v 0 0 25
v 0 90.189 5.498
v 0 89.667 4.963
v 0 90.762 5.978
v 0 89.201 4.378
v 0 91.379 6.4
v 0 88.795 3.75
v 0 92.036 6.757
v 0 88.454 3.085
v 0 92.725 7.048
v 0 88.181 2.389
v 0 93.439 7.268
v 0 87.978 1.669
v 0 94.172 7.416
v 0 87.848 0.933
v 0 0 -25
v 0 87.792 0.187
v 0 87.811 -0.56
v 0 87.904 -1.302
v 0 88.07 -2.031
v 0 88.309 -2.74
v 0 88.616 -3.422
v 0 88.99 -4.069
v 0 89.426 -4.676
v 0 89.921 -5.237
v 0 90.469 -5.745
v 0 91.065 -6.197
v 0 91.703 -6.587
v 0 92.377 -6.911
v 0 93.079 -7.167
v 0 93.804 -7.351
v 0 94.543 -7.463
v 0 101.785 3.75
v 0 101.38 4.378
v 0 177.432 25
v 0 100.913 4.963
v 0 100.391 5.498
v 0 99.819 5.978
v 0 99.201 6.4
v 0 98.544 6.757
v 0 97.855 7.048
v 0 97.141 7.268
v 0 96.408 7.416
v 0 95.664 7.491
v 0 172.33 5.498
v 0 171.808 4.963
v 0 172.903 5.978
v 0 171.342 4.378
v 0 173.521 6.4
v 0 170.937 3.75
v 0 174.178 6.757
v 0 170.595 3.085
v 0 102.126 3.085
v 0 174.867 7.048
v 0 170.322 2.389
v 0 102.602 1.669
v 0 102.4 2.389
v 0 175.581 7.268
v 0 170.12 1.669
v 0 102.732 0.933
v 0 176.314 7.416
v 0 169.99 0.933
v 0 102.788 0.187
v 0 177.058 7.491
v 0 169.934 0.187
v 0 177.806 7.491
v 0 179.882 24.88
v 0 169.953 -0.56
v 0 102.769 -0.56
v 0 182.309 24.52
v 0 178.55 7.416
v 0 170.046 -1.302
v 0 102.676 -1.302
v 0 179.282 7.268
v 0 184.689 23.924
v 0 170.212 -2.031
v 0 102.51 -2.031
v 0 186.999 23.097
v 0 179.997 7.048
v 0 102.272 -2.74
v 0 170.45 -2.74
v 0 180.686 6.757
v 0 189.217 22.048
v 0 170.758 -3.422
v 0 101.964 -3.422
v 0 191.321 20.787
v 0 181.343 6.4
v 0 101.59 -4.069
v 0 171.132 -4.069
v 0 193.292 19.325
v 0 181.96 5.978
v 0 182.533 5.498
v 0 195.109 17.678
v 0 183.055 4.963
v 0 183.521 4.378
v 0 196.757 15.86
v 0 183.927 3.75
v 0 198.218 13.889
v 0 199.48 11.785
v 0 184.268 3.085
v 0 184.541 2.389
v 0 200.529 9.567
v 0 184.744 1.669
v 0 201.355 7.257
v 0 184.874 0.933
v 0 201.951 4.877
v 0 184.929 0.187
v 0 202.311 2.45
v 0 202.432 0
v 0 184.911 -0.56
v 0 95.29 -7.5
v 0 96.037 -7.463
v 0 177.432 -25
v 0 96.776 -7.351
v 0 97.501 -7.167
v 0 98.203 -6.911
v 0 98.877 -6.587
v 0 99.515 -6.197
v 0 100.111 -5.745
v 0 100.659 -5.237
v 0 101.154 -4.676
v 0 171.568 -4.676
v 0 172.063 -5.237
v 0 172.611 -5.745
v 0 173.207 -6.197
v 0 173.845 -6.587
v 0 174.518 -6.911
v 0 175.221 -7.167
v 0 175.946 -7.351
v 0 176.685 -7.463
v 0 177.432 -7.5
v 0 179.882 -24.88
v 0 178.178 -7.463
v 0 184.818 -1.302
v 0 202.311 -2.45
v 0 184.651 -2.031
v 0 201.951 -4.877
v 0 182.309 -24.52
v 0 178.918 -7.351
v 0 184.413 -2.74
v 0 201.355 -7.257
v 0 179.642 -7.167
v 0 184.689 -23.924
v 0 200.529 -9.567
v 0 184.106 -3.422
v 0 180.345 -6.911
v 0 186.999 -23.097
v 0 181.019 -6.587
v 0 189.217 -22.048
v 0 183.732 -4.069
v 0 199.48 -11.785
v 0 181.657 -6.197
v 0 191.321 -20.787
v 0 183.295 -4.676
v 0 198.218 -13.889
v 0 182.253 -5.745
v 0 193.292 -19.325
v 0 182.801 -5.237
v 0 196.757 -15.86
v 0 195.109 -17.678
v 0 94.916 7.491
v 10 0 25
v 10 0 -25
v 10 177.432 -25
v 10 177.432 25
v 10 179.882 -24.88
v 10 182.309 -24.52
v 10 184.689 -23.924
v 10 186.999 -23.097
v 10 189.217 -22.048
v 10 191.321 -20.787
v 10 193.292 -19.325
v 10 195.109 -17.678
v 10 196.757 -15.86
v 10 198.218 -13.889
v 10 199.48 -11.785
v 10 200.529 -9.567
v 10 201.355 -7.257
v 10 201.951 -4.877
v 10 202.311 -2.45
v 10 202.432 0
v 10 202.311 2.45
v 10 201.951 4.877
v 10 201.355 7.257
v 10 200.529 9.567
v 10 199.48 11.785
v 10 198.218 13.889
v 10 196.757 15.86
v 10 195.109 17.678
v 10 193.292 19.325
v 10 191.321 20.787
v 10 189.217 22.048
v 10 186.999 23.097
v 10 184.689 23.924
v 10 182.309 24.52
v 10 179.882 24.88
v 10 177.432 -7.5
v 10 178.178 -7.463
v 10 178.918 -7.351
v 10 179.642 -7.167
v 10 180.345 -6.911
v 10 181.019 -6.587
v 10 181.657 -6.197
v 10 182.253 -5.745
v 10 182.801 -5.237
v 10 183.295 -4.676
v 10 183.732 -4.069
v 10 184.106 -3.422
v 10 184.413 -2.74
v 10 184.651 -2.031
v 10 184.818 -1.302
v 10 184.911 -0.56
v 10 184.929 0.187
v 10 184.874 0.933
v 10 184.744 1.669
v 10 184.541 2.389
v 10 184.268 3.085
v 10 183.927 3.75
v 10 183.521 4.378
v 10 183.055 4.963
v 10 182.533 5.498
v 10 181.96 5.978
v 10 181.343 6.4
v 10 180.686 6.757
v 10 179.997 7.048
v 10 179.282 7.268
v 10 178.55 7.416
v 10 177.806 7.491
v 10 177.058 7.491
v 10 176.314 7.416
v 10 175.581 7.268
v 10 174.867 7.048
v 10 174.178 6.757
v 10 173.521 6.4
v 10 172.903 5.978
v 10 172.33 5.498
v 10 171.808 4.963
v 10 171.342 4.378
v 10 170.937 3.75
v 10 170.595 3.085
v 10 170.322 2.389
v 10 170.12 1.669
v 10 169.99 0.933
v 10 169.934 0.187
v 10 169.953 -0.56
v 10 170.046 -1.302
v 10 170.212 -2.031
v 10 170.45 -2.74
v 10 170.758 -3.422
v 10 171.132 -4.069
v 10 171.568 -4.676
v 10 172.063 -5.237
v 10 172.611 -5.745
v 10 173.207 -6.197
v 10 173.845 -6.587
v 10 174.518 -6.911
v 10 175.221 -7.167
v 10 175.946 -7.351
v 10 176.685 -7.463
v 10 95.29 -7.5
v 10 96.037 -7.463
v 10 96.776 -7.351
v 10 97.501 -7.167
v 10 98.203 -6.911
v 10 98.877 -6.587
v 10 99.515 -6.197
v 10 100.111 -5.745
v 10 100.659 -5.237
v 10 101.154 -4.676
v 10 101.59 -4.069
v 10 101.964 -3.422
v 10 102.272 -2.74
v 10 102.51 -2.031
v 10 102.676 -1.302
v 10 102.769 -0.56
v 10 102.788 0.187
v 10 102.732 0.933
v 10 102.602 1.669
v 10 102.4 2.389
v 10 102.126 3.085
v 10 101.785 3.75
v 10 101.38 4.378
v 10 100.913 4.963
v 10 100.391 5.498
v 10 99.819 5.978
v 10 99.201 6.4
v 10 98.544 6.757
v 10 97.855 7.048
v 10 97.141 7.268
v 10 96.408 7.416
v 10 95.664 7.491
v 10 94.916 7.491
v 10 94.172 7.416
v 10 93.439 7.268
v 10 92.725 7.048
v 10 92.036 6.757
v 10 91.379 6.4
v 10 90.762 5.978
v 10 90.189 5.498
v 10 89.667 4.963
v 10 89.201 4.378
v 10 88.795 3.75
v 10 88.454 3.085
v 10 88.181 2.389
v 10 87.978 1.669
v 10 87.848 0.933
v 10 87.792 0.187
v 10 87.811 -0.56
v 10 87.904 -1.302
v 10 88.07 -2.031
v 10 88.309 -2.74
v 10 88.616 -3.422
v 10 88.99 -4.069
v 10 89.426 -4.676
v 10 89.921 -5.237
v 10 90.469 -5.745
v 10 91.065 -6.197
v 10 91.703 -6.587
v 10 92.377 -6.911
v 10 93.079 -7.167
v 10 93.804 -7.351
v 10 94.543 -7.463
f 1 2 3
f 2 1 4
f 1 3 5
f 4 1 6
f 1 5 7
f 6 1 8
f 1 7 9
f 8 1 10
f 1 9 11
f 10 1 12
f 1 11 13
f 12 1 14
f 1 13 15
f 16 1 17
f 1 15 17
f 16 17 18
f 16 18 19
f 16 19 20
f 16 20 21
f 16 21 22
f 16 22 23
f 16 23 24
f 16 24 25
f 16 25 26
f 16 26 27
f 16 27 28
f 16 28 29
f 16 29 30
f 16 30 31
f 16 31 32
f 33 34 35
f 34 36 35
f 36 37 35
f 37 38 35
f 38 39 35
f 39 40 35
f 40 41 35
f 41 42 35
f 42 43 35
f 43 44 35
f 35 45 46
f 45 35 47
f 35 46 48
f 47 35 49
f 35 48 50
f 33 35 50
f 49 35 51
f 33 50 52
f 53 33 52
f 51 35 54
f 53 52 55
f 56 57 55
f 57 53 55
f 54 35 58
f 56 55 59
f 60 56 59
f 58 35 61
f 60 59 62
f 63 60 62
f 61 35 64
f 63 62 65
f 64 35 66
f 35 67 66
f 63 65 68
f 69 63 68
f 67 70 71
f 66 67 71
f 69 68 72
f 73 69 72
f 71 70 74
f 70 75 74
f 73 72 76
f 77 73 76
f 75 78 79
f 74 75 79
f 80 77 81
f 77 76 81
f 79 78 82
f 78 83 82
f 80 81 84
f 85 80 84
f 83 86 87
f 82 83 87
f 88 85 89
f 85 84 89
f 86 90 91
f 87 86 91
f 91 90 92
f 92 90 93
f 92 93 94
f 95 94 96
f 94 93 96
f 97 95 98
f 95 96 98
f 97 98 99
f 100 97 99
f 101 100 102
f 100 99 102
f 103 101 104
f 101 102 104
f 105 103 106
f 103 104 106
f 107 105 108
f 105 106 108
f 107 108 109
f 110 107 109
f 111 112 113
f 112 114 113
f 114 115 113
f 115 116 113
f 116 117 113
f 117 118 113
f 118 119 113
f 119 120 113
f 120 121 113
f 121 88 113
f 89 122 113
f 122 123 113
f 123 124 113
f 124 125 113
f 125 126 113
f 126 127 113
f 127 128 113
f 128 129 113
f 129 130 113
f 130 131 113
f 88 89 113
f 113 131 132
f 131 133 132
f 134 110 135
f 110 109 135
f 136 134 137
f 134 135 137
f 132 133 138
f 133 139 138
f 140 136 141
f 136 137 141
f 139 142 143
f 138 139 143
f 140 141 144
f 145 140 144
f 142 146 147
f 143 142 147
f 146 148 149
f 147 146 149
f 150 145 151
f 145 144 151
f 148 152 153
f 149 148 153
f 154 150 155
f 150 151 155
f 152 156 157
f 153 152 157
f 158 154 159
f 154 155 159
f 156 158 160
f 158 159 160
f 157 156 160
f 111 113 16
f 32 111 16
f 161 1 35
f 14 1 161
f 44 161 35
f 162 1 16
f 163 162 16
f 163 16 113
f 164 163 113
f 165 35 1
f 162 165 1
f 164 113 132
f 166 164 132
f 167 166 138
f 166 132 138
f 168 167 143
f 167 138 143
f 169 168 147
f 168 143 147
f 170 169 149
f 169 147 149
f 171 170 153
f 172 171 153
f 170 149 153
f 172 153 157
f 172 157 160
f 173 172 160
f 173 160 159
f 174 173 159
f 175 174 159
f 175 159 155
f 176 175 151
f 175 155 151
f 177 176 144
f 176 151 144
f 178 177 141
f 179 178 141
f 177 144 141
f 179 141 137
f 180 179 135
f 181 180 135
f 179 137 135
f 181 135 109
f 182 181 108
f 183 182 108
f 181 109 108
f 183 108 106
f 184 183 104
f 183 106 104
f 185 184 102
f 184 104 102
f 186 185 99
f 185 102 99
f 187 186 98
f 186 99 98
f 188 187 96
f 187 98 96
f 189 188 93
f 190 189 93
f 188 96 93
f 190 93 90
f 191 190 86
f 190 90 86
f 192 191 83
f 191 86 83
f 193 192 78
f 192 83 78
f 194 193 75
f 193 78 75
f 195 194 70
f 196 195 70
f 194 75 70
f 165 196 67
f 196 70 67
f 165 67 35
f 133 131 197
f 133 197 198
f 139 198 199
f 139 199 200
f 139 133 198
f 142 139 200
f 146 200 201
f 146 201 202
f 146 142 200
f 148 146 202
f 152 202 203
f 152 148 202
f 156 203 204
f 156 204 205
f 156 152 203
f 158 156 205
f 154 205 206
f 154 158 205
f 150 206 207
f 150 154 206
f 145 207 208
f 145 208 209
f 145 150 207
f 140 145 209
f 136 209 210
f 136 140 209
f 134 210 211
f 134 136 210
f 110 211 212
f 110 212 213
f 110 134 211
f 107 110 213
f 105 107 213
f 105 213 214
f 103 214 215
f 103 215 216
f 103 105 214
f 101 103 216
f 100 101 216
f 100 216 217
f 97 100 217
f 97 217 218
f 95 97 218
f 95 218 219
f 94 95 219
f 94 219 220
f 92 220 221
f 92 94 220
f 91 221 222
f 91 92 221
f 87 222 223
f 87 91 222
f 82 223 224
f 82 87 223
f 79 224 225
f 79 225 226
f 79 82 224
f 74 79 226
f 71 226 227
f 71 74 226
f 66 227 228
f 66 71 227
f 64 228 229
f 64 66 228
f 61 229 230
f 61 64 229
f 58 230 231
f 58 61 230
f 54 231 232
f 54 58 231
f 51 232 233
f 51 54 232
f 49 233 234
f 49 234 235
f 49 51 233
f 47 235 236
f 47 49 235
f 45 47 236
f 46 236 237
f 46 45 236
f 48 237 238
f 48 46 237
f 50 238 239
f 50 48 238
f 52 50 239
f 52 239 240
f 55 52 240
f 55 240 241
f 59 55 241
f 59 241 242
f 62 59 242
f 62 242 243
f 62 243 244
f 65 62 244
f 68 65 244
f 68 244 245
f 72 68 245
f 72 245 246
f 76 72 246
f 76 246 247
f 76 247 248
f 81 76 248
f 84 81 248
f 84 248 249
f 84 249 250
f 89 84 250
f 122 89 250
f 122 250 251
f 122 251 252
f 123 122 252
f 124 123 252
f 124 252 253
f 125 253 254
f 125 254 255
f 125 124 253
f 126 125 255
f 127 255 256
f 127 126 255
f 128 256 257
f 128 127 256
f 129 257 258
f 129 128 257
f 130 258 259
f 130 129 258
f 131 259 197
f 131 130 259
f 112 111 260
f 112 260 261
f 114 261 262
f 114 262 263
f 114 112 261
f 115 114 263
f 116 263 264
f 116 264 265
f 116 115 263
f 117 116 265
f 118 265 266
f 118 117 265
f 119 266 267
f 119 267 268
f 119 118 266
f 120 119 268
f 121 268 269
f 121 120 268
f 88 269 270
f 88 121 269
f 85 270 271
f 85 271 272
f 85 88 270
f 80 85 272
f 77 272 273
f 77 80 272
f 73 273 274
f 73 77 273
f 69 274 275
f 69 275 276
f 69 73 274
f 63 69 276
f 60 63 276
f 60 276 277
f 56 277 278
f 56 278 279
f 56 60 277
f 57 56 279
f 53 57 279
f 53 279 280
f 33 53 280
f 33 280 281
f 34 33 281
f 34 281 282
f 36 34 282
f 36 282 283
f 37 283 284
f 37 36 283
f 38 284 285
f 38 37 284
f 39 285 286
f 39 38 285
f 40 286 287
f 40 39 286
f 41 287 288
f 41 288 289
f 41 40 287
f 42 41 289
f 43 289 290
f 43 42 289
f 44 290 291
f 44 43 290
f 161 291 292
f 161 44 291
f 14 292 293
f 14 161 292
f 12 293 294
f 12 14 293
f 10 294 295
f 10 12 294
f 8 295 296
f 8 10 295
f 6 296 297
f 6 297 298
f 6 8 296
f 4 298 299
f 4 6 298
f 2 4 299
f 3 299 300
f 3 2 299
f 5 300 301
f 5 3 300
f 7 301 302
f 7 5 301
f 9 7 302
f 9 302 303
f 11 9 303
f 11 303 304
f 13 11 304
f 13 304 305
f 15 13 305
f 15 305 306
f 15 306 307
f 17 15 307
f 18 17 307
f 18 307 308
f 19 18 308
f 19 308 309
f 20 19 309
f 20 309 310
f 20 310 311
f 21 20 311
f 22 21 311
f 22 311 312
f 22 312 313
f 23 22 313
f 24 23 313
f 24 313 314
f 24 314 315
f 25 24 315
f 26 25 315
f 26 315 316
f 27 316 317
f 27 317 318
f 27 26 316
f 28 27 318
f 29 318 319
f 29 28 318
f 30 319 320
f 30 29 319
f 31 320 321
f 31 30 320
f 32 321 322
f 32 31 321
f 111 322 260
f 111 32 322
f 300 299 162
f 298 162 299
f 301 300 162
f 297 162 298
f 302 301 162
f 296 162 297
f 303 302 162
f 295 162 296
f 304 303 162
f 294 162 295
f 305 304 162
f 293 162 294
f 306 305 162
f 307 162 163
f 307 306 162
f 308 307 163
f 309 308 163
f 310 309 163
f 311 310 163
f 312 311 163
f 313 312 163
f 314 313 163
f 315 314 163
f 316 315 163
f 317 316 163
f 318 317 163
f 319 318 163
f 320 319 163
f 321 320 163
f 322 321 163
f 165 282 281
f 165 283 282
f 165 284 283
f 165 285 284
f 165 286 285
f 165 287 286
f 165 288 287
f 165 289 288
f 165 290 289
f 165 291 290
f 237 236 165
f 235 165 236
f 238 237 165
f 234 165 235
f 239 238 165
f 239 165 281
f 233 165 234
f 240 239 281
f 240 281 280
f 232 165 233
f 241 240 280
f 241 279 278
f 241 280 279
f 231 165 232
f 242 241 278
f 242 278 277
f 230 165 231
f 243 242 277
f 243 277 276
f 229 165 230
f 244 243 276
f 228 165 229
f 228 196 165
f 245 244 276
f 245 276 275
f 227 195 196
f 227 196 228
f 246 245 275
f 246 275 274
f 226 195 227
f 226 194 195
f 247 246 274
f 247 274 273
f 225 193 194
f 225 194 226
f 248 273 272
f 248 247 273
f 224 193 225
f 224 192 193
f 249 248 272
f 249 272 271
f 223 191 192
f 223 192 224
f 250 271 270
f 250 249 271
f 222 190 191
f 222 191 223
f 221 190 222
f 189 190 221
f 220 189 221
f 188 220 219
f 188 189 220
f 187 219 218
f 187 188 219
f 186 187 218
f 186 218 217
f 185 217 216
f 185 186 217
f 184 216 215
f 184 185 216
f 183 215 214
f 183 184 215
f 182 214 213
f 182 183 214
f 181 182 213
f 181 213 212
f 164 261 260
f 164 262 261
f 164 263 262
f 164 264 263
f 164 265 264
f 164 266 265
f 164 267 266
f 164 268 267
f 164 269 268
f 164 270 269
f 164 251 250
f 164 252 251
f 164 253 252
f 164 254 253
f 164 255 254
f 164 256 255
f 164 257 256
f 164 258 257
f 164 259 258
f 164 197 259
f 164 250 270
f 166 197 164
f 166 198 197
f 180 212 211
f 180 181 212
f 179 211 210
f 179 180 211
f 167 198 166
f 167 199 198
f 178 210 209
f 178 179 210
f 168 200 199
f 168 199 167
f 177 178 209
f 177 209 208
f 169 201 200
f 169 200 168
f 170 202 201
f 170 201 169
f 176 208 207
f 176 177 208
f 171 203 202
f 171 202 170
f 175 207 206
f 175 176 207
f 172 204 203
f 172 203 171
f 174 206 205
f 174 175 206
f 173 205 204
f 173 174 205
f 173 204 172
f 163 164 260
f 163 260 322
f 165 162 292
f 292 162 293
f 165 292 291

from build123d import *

# Parameters (mm, degrees)
SKETCH1_R           = 7.5
BOSS_EXTRUDE1_DEPTH = 10


with BuildPart() as part:
    # Sketch1 → Boss-Extrude1 (new body)
    with BuildSketch(Plane(origin=(0, 0, 0), x_dir=(0, 0, -1), z_dir=(1, 0, 0))):
        with BuildLine():
            Line((-25, 0), (25, 0))
            Line((25, 0), (25, 177.43174))
            ThreePointArc((25, 177.43174), (0, 202.43174), (-25, 177.43174))
            Line((-25, 177.43174), (-25, 0))
        make_face()
        with Locations((0, 95.2901012)):
            Circle(SKETCH1_R, mode=Mode.SUBTRACT)
        with Locations((0, 177.43174)):
            Circle(SKETCH1_R, mode=Mode.SUBTRACT)
    extrude(amount=BOSS_EXTRUDE1_DEPTH)


solid = part.part
